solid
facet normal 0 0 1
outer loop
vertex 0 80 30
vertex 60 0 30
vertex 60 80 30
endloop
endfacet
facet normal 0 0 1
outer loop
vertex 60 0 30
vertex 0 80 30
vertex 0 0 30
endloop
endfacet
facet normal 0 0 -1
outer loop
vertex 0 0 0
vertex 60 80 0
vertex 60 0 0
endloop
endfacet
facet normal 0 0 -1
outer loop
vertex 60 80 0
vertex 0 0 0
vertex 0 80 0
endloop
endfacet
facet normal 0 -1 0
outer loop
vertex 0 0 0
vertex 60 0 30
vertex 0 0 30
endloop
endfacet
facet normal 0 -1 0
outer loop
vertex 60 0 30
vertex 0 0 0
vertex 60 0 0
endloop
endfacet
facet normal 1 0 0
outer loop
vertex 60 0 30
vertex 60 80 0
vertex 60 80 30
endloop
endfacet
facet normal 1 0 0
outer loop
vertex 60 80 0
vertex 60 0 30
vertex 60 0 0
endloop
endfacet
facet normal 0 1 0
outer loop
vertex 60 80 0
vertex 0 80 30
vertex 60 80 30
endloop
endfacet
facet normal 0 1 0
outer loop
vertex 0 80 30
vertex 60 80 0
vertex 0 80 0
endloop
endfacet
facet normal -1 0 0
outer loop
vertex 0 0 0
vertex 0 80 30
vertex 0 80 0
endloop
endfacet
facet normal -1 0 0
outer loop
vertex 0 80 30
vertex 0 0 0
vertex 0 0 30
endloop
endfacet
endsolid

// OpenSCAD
// =====================================================================
//  APRENDE OPENSCAD EN 7 PASOS — una caja sencilla
// =====================================================================
//
//  Cómo usar este archivo:
//    1. Cambia el número de `paso` (justo debajo) de 1 a 7.
//    2. Pulsa F5 (vista previa rápida) para ver el resultado.
//    3. Lee el comentario de ese paso más abajo.
//
//  Ratón en la vista 3D:
//    - Arrastrar con botón izquierdo  → girar
//    - Arrastrar con botón derecho    → mover
//    - Rueda                          → zoom
//
//  Las medidas son siempre en MILÍMETROS.
// =====================================================================

paso = 1;   // <-- CAMBIA ESTE NÚMERO (1 a 7) y pulsa F5


// ---------------------------------------------------------------------
//  PARÁMETROS: las medidas de la caja, todas en un sitio.
//  Si quieres la caja más grande, cambia aquí y se adapta todo.
// ---------------------------------------------------------------------
ancho  = 60;    // eje X
largo  = 80;    // eje Y
alto   = 30;    // eje Z
pared  = 2.5;   // grosor de las paredes

agujero_led  = 6;    // diámetro del agujero del LED
agujero_jack = 6;    // diámetro del agujero del jack

$fn = 64;  // suavidad de los círculos (más = más redondo, más lento)


// ---------------------------------------------------------------------
//  PASO 1 — Un bloque.
//  cube([X, Y, Z]) crea una caja maciza desde el origen (0,0,0).
// ---------------------------------------------------------------------
if (paso == 1) {
    cube([ancho, largo, alto]);
}


// ---------------------------------------------------------------------
//  PASO 2 — Vaciar el bloque con difference().
//  difference() { A; B; } = A menos B.
//  El primer objeto es el bloque; el segundo, un bloque más pequeño
//  que "muerde" el interior. translate([x,y,z]) lo mueve.
//
//  Truco: el bloque interior sube por encima del borde (+1) para que
//  la caja quede abierta por arriba y no salga una "piel" fantasma.
// ---------------------------------------------------------------------
if (paso == 2) {
    difference() {
        cube([ancho, largo, alto]);
        translate([pared, pared, pared])
            cube([ancho - 2*pared, largo - 2*pared, alto]);
    }
}


// ---------------------------------------------------------------------
//  PASO 3 — Ver lo que restas con "#".
//  Pon # delante de una pieza y se dibuja en rojo transparente.
//  Es la mejor forma de comprobar que un agujero está donde quieres.
// ---------------------------------------------------------------------
if (paso == 3) {
    difference() {
        cube([ancho, largo, alto]);
        # translate([pared, pared, pared])
            cube([ancho - 2*pared, largo - 2*pared, alto]);
    }
}


// ---------------------------------------------------------------------
//  PASO 4 — Agujero redondo en una pared (el del jack).
//  cylinder(d = diámetro, h = altura) crea un cilindro vertical.
//  rotate([90, 0, 0]) lo tumba para que atraviese la pared delantera.
// ---------------------------------------------------------------------
if (paso == 4) {
    difference() {
        cube([ancho, largo, alto]);
        translate([pared, pared, pared])
            cube([ancho - 2*pared, largo - 2*pared, alto]);

        // Jack: centrado en el ancho, a media altura, en la pared de delante
        # translate([ancho/2, pared + 1, alto/2])
            rotate([90, 0, 0])
                cylinder(d = agujero_jack, h = pared + 2);
    }
}


// ---------------------------------------------------------------------
//  PASO 5 — Módulos: piezas con nombre que puedes reutilizar.
//  module nombre() { ... } define la pieza; nombre(); la dibuja.
//  Aquí la caja pasa a ser un módulo, y la tapa, otro.
// ---------------------------------------------------------------------
module caja() {
    difference() {
        cube([ancho, largo, alto]);
        translate([pared, pared, pared])
            cube([ancho - 2*pared, largo - 2*pared, alto]);
        translate([ancho/2, pared + 1, alto/2])
            rotate([90, 0, 0])
                cylinder(d = agujero_jack, h = pared + 2);
    }
}

module tapa() {
    difference() {
        cube([ancho, largo, pared]);
        // Agujero del LED, en el centro de la tapa
        translate([ancho/2, largo/2, -1])
            cylinder(d = agujero_led, h = pared + 2);
    }
}

if (paso == 5) {
    caja();
    // La tapa, dibujada al lado (desplazada en X) para verlas las dos
    translate([ancho + 10, 0, 0]) tapa();
}


// ---------------------------------------------------------------------
//  PASO 6 — Montar las piezas para ver cómo encajan.
//  color("nombre", transparencia) solo cambia cómo se ve en pantalla.
//  La tapa se coloca encima de la caja con translate.
// ---------------------------------------------------------------------
if (paso == 6) {
    color("orange") caja();
    color("steelblue", 0.6) translate([0, 0, alto]) tapa();
}


// ---------------------------------------------------------------------
//  PASO 7 — Preparar para imprimir.
//  Para la impresora, cada pieza va por separado y apoyada en la cama.
//  1. Deja aquí solo la pieza que quieras exportar (caja o tapa).
//  2. Pulsa F6 (render completo; tarda más que F5).
//  3. Menú File → Export → Export as STL…
//  4. Abre el STL en el programa de tu impresora (Photon Workshop, Lychee…).
// ---------------------------------------------------------------------
if (paso == 7) {
    caja();
}


// =====================================================================
//  PARA EXPERIMENTAR
//  - Cambia `ancho`, `largo` o `alto` arriba y mira cómo se adapta todo.
//  - Cambia `pared` a 1 o a 5.
//  - Cambia `$fn` a 6: ¡los agujeros salen hexagonales!
//  - En el paso 4, cambia `alto/2` por `alto - 8` para subir el jack.
//
//  Chuleta:
//    cube([x,y,z])            bloque
//    cylinder(d=, h=)         cilindro
//    sphere(d=)               esfera
//    translate([x,y,z])       mover
//    rotate([x,y,z])          girar (grados)
//    difference() { A; B; }   A menos B
//    union() { A; B; }        A más B
//    # pieza                  ver en rojo lo que se resta
//    module nombre() { }      pieza reutilizable
// =====================================================================
